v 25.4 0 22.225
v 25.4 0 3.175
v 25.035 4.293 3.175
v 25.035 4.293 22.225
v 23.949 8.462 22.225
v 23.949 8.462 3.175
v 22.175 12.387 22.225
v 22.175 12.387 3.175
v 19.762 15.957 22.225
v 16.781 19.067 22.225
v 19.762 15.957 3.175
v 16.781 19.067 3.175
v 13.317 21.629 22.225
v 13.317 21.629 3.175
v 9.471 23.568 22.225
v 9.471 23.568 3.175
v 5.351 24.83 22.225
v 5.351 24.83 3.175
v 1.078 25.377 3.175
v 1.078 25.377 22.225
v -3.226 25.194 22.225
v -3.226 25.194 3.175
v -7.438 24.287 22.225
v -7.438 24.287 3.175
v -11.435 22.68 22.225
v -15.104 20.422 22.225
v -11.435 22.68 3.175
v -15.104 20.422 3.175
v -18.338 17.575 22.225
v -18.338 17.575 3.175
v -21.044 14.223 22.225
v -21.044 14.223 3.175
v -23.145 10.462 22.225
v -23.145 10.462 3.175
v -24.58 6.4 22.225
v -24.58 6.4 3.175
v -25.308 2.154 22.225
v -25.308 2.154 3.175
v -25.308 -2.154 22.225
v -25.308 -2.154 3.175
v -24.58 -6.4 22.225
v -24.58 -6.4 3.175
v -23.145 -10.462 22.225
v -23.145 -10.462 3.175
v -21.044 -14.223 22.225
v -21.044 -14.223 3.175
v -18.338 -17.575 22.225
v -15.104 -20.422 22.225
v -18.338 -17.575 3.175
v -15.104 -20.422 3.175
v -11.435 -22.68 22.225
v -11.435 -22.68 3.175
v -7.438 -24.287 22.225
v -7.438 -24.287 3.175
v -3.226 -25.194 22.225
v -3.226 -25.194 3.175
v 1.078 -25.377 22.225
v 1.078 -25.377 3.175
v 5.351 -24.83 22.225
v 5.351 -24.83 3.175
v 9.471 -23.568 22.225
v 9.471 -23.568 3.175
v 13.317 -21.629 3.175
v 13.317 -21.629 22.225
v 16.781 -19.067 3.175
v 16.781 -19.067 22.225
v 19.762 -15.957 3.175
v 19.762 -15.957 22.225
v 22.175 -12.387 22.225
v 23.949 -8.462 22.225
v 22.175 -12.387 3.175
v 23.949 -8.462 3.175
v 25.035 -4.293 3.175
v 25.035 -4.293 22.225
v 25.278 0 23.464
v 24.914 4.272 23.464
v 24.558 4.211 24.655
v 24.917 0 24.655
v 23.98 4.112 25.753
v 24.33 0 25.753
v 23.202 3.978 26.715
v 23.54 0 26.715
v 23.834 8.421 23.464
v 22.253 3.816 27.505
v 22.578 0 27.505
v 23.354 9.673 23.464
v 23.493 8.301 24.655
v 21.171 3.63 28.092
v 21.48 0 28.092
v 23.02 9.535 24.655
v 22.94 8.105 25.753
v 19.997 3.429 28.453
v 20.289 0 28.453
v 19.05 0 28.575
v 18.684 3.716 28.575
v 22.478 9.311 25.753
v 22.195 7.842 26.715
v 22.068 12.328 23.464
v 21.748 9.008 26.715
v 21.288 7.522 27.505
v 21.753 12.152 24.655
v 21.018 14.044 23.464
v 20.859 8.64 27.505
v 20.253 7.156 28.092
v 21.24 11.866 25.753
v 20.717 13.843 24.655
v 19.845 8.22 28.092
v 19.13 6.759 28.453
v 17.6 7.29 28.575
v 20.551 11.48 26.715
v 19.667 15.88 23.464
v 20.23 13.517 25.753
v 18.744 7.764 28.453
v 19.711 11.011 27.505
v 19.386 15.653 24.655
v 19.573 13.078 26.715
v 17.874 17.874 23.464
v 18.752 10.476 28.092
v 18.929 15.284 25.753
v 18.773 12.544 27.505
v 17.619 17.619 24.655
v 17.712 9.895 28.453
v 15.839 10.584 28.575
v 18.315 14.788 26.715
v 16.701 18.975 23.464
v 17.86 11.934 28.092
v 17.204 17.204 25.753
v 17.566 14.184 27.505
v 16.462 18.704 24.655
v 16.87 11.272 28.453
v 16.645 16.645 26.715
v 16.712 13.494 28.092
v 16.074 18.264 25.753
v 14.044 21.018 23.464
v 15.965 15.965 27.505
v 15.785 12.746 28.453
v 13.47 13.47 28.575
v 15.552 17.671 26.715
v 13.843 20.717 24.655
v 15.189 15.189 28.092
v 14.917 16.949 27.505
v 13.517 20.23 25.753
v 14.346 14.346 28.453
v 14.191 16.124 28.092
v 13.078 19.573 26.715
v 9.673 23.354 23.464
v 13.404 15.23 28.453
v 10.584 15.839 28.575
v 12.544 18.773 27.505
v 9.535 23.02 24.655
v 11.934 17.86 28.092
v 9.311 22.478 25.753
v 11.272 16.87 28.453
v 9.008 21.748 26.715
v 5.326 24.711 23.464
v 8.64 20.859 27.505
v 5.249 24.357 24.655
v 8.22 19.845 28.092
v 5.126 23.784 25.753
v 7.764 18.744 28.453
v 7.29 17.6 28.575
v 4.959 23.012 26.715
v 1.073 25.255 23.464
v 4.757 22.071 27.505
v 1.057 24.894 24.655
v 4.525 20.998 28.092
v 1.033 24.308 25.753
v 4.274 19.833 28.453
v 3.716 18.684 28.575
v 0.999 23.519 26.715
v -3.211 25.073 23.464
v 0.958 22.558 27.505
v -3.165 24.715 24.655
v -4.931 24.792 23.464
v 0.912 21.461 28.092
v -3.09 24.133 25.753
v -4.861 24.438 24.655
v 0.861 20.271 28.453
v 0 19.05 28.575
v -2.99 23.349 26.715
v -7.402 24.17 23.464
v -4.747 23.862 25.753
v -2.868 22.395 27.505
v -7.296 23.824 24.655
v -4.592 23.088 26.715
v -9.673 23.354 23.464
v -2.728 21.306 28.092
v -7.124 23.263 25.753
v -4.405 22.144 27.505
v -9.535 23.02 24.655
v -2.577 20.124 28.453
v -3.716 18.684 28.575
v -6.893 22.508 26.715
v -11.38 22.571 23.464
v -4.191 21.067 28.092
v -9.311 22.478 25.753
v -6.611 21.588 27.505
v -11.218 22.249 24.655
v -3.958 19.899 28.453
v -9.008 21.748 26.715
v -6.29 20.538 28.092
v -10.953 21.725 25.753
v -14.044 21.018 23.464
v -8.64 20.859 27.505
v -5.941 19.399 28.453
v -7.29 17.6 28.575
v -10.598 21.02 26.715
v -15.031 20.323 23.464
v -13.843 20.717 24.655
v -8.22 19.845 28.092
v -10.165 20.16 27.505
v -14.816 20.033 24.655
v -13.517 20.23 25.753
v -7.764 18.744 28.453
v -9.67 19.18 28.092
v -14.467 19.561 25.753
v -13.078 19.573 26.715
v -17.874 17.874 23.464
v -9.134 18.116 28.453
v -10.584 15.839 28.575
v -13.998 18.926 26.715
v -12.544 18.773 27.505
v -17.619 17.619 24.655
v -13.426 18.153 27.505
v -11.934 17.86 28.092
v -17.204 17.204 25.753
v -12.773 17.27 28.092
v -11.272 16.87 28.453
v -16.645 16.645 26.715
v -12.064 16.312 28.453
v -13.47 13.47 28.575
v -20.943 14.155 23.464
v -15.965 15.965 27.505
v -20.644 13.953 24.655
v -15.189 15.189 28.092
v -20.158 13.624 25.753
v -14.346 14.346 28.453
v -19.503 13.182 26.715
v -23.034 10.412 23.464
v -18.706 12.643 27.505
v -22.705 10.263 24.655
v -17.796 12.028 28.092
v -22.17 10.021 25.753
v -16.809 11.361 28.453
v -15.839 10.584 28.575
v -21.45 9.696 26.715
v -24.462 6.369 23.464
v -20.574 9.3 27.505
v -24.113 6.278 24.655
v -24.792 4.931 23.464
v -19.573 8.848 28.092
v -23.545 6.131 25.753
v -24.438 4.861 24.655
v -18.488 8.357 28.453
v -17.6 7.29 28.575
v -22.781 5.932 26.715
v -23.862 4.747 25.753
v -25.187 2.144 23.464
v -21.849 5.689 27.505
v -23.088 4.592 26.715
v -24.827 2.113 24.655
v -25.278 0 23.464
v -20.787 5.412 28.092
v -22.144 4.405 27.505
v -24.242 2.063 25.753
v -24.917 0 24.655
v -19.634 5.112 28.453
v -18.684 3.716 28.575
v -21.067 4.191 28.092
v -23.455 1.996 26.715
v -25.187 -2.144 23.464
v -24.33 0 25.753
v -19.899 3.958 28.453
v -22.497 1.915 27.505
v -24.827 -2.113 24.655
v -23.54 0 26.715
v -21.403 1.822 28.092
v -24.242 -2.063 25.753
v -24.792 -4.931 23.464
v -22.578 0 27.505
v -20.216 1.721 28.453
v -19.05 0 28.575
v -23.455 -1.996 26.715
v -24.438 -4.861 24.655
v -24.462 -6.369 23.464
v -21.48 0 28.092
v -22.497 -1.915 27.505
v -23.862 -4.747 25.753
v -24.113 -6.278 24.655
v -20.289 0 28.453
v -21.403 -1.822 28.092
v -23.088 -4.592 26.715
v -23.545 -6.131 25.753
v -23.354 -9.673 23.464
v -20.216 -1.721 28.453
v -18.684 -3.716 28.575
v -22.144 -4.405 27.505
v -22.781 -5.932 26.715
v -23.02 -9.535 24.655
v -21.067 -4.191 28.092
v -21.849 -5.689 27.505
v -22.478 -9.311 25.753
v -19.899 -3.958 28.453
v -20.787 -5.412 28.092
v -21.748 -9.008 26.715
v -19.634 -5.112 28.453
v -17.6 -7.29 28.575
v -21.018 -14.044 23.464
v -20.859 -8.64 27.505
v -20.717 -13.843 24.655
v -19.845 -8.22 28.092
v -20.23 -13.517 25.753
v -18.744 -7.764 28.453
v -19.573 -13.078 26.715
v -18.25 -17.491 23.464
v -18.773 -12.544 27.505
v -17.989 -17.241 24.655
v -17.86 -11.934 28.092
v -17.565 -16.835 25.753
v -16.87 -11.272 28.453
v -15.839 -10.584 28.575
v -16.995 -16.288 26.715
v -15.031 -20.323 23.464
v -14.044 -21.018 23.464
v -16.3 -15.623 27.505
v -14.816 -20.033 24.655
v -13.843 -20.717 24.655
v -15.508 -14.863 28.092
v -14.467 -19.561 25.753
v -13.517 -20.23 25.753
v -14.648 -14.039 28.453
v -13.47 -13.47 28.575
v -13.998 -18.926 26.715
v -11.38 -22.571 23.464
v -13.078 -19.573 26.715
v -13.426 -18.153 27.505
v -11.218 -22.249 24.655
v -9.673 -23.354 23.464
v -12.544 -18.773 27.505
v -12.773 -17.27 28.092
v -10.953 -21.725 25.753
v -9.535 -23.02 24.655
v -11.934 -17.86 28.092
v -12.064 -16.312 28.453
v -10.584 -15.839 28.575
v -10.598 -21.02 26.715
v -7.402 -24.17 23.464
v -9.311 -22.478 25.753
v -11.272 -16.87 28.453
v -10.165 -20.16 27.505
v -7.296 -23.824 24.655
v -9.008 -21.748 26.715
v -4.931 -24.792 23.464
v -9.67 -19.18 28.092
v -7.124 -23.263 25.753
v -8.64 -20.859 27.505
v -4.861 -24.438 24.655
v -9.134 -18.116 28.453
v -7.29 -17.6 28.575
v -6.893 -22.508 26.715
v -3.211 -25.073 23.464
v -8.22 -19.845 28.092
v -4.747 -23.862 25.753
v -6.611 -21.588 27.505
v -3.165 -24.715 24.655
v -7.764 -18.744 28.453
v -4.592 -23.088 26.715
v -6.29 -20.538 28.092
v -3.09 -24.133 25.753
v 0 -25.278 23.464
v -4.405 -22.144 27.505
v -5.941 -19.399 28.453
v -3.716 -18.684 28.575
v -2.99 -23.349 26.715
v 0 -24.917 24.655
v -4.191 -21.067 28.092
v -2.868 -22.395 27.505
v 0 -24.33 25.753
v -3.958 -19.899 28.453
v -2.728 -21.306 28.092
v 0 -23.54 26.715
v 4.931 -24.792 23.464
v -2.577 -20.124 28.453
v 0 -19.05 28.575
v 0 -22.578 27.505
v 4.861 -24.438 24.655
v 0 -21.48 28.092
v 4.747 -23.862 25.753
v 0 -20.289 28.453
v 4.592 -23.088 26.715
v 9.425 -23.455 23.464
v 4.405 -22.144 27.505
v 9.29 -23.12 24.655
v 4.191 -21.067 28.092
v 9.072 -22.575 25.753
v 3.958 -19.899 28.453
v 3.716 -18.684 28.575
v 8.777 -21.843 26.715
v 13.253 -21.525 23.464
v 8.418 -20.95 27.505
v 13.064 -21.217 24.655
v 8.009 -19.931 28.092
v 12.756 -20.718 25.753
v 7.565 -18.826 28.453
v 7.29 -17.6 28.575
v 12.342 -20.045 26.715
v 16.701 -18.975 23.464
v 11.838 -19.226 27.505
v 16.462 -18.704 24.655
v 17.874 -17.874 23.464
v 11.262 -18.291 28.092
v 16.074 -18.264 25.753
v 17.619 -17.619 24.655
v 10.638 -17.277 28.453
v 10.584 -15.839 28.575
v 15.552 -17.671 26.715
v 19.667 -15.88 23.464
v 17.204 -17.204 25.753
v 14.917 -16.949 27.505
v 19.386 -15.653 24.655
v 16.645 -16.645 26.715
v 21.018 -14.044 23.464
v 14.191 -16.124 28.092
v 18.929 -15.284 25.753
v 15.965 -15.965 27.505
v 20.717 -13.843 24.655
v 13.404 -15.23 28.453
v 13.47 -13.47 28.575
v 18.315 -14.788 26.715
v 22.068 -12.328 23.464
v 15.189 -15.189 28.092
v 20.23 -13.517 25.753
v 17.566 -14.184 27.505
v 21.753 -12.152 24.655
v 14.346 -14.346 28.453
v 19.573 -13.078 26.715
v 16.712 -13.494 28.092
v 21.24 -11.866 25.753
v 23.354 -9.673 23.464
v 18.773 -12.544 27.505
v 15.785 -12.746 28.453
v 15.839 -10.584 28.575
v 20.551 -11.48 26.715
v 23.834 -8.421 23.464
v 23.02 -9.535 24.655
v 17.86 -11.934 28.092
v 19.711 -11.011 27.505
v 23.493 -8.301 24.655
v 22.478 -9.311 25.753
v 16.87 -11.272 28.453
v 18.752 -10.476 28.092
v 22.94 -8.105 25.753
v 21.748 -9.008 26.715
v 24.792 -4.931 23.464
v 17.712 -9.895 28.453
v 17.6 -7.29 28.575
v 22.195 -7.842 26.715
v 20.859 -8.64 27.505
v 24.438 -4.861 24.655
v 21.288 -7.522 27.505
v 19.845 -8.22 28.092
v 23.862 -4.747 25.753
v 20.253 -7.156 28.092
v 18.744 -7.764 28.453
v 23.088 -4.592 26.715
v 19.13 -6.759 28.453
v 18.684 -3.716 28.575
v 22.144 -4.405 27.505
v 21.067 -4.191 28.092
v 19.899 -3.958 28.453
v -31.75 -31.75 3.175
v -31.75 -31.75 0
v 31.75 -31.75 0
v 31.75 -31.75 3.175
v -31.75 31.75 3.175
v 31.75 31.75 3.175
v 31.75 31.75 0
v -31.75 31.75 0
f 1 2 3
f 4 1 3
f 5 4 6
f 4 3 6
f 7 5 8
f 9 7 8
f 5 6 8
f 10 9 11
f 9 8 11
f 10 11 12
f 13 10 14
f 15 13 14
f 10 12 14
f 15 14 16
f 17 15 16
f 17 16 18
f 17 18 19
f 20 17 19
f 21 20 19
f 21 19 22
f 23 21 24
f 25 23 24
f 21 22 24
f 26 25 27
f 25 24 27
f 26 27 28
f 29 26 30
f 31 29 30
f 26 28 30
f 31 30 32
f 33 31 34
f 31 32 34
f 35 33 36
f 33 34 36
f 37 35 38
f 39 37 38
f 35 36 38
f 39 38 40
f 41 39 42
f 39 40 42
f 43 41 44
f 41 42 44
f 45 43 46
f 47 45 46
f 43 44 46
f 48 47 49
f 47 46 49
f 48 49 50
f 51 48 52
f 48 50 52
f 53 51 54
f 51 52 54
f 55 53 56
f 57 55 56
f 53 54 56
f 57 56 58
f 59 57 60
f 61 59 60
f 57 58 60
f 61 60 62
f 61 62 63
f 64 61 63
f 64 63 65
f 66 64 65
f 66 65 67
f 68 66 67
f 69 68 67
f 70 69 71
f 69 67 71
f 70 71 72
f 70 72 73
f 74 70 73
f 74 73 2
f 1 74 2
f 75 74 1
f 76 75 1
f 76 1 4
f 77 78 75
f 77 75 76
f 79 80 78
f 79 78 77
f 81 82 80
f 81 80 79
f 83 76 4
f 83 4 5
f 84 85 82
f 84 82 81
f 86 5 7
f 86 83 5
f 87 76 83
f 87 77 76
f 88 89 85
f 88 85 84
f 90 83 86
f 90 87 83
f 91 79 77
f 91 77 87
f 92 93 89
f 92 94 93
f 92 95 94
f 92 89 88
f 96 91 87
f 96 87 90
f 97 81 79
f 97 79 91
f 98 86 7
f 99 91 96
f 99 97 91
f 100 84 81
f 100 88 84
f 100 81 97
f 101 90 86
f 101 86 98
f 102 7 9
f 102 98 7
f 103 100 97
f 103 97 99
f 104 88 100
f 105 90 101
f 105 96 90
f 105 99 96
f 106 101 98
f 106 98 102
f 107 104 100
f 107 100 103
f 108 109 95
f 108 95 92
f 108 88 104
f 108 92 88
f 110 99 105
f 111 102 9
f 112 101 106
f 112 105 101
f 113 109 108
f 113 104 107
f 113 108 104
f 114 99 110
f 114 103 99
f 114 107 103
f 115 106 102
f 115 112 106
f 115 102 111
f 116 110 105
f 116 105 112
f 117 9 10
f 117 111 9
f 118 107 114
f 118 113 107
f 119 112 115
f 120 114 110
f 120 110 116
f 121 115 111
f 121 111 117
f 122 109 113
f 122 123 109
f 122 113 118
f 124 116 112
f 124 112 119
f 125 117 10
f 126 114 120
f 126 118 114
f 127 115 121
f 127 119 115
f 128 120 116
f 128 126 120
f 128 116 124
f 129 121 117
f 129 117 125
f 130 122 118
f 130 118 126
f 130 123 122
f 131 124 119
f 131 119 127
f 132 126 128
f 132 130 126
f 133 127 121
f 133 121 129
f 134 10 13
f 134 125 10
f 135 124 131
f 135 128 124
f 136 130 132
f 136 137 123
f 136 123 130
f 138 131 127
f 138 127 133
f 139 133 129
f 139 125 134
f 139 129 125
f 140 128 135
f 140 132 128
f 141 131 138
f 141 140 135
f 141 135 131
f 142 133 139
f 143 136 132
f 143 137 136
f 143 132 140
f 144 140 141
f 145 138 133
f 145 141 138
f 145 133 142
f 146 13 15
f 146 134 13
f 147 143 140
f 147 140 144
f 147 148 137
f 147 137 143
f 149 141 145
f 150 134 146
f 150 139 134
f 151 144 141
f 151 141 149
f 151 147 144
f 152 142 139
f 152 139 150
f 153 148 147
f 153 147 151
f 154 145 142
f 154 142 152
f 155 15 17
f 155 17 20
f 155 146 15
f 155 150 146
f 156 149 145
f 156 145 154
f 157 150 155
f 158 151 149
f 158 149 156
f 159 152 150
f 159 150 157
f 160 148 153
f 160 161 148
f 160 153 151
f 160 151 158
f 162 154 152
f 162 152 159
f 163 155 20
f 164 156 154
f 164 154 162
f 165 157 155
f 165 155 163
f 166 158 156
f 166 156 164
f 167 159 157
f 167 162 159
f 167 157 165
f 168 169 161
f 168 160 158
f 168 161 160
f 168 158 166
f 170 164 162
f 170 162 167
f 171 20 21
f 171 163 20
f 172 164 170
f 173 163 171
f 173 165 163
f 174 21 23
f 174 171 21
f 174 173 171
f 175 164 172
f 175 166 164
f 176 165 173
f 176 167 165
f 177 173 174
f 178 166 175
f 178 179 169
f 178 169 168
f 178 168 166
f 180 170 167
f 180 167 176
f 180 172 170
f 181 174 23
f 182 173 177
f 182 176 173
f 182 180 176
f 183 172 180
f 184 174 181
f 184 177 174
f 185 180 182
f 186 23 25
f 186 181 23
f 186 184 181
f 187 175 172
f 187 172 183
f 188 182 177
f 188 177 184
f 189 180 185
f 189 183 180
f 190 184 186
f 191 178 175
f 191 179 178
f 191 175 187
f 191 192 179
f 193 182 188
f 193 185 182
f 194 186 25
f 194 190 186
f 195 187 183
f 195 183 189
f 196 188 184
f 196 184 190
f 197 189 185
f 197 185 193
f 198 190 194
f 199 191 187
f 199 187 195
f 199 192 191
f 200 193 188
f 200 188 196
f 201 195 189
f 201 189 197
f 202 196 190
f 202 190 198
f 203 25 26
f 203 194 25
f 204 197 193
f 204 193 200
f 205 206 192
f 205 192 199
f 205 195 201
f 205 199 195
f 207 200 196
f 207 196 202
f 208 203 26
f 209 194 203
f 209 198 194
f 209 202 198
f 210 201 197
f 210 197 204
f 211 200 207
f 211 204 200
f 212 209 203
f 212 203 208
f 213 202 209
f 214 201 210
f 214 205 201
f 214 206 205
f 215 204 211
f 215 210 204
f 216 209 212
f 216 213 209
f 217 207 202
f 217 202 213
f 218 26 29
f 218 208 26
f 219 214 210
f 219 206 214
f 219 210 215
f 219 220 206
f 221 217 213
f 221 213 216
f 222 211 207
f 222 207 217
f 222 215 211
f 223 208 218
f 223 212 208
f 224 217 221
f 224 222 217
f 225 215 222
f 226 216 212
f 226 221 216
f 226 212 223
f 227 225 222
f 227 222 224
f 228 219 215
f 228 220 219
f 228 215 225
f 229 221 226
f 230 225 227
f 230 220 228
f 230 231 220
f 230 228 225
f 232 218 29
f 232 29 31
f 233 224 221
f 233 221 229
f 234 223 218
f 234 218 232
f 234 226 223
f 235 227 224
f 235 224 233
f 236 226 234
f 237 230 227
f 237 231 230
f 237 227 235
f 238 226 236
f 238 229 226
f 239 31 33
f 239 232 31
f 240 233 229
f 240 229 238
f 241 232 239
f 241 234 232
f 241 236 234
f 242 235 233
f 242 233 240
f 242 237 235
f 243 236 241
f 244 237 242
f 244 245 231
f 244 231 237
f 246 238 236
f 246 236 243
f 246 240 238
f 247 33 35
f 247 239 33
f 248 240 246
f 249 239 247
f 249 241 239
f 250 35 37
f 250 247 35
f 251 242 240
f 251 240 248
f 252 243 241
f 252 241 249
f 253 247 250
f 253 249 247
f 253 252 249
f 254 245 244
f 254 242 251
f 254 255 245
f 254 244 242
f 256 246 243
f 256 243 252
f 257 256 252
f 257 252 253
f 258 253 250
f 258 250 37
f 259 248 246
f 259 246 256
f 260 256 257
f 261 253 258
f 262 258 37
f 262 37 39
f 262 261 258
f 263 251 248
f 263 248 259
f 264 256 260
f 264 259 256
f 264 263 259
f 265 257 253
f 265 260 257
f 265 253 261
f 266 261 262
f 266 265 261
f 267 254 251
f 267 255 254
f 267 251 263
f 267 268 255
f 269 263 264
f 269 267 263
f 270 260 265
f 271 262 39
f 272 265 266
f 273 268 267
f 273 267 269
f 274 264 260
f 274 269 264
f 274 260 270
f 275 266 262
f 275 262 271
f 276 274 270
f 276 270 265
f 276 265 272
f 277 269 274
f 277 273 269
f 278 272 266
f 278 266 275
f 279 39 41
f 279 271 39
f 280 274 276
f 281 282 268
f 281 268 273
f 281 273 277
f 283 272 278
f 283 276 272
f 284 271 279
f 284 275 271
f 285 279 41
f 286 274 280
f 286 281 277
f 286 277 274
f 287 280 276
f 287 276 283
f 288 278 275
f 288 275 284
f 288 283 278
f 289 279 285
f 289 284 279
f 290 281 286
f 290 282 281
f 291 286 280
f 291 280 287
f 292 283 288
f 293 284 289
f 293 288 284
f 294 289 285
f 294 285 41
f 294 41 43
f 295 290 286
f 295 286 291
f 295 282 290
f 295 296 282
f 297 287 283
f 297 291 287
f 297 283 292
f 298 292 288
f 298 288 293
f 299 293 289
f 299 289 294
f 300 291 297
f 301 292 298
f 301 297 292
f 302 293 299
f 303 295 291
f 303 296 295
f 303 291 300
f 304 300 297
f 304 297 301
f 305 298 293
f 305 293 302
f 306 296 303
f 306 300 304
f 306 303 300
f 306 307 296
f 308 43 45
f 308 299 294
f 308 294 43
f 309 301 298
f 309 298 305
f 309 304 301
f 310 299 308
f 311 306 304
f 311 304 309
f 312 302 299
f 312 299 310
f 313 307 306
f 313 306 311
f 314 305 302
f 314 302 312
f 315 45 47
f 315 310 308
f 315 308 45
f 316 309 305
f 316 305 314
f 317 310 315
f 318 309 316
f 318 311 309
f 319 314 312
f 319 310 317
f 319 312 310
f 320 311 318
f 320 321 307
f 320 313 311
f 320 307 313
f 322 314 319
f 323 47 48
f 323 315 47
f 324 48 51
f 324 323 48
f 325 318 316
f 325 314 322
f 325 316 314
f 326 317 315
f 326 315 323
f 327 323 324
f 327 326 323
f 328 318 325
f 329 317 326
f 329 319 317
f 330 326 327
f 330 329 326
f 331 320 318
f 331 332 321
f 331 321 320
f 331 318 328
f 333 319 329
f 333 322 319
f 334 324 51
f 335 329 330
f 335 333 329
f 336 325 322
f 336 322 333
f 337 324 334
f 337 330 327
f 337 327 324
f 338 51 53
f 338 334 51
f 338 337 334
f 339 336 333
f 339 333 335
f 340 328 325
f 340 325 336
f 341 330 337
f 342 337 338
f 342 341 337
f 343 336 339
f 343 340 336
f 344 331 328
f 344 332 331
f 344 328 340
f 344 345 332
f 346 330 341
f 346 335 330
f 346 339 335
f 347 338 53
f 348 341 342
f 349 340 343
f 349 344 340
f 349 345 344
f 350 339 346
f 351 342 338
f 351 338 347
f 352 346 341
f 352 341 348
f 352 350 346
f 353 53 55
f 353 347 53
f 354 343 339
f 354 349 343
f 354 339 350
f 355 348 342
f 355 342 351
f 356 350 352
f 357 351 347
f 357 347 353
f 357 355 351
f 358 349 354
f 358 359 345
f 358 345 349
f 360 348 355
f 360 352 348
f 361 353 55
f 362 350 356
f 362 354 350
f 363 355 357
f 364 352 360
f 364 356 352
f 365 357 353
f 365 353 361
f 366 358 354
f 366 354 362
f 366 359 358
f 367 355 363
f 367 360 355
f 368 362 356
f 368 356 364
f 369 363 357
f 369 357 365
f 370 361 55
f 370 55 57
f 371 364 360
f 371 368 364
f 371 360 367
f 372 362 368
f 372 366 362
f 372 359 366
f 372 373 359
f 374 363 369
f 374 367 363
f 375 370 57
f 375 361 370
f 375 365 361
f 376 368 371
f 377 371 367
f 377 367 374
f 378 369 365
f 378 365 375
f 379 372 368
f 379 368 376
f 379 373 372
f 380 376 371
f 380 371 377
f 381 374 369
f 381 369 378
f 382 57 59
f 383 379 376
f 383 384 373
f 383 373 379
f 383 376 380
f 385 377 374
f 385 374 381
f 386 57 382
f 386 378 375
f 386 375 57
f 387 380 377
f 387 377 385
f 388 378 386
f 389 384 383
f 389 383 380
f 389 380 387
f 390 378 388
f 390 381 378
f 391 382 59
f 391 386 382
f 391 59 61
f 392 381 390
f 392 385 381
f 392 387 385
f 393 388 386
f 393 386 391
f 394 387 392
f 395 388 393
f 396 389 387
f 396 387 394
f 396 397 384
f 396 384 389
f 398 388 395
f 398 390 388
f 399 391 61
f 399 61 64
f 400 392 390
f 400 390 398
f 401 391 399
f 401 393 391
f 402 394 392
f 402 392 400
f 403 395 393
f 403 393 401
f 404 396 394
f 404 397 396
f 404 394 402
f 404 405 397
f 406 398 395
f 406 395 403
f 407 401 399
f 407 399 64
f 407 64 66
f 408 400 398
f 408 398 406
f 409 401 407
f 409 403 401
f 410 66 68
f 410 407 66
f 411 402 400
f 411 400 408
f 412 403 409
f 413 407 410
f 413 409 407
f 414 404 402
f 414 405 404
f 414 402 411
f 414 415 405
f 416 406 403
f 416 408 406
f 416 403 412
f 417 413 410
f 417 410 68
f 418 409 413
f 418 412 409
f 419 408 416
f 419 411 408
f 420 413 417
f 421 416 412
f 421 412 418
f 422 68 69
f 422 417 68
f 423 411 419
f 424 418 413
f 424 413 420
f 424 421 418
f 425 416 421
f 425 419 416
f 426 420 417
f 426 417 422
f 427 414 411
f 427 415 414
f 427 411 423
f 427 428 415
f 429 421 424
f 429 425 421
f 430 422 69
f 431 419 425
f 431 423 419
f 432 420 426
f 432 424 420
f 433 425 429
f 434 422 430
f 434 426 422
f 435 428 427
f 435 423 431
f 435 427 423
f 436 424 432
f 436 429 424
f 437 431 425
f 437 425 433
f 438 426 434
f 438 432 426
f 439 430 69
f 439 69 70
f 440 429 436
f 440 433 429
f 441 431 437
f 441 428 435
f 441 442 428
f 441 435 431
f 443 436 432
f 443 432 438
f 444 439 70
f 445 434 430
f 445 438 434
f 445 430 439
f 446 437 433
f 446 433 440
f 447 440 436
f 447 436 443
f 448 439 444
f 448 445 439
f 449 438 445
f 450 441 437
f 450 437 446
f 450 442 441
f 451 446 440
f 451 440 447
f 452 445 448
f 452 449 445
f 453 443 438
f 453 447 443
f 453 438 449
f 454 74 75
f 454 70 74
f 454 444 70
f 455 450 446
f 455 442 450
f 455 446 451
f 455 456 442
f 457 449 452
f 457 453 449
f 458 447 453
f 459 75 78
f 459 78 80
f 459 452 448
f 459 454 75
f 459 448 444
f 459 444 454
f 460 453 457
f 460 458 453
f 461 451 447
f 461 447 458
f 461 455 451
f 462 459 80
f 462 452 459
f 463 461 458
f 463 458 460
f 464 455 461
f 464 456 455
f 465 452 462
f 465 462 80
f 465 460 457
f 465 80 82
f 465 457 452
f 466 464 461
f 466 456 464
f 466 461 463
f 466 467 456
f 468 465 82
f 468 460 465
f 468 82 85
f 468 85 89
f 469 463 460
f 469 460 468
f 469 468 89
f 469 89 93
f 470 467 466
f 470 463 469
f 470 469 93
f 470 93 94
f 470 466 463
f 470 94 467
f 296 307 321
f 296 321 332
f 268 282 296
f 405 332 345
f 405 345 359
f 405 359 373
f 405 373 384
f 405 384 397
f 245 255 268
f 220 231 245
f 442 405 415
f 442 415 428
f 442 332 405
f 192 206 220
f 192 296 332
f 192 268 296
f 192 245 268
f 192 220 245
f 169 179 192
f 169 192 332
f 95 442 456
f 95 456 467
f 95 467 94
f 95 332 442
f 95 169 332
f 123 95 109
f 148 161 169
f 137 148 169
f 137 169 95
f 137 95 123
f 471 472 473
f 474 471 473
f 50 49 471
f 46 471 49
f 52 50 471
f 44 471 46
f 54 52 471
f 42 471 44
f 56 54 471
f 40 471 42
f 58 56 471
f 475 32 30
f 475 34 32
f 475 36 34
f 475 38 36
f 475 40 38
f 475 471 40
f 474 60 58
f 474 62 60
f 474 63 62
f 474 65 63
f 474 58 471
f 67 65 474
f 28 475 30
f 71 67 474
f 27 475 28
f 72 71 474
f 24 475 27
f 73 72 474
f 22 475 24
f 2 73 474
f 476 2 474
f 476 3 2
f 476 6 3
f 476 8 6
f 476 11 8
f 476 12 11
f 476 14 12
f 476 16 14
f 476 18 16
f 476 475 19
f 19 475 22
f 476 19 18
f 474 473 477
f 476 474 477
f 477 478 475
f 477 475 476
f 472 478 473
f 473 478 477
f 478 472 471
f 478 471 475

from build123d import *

# Parameters (mm, degrees)
F0_W     = 63.5
F0_H     = 63.5
F1_DEPTH = 3.175
F2_R     = 25.4
F3_DEPTH = 25.4
F4_R     = 6.35


with BuildPart() as f1:
    # F0 (on Top) → F1 (new body)
    with BuildSketch(Plane.XY):
        Rectangle(F0_W, F0_H)
    extrude(amount=F1_DEPTH)

    # F2 (on face) → F3 (join)
    with BuildSketch(Plane.XY.offset(3.175)):
        Circle(F2_R)
    extrude(amount=F3_DEPTH)

    # F4
    f4_edges = [f1.edges().sort_by_distance(p)[0] for p in [
        (-25.4, 0, 28.575),
    ]]
    fillet(f4_edges, radius=F4_R)


solid = f1.part
